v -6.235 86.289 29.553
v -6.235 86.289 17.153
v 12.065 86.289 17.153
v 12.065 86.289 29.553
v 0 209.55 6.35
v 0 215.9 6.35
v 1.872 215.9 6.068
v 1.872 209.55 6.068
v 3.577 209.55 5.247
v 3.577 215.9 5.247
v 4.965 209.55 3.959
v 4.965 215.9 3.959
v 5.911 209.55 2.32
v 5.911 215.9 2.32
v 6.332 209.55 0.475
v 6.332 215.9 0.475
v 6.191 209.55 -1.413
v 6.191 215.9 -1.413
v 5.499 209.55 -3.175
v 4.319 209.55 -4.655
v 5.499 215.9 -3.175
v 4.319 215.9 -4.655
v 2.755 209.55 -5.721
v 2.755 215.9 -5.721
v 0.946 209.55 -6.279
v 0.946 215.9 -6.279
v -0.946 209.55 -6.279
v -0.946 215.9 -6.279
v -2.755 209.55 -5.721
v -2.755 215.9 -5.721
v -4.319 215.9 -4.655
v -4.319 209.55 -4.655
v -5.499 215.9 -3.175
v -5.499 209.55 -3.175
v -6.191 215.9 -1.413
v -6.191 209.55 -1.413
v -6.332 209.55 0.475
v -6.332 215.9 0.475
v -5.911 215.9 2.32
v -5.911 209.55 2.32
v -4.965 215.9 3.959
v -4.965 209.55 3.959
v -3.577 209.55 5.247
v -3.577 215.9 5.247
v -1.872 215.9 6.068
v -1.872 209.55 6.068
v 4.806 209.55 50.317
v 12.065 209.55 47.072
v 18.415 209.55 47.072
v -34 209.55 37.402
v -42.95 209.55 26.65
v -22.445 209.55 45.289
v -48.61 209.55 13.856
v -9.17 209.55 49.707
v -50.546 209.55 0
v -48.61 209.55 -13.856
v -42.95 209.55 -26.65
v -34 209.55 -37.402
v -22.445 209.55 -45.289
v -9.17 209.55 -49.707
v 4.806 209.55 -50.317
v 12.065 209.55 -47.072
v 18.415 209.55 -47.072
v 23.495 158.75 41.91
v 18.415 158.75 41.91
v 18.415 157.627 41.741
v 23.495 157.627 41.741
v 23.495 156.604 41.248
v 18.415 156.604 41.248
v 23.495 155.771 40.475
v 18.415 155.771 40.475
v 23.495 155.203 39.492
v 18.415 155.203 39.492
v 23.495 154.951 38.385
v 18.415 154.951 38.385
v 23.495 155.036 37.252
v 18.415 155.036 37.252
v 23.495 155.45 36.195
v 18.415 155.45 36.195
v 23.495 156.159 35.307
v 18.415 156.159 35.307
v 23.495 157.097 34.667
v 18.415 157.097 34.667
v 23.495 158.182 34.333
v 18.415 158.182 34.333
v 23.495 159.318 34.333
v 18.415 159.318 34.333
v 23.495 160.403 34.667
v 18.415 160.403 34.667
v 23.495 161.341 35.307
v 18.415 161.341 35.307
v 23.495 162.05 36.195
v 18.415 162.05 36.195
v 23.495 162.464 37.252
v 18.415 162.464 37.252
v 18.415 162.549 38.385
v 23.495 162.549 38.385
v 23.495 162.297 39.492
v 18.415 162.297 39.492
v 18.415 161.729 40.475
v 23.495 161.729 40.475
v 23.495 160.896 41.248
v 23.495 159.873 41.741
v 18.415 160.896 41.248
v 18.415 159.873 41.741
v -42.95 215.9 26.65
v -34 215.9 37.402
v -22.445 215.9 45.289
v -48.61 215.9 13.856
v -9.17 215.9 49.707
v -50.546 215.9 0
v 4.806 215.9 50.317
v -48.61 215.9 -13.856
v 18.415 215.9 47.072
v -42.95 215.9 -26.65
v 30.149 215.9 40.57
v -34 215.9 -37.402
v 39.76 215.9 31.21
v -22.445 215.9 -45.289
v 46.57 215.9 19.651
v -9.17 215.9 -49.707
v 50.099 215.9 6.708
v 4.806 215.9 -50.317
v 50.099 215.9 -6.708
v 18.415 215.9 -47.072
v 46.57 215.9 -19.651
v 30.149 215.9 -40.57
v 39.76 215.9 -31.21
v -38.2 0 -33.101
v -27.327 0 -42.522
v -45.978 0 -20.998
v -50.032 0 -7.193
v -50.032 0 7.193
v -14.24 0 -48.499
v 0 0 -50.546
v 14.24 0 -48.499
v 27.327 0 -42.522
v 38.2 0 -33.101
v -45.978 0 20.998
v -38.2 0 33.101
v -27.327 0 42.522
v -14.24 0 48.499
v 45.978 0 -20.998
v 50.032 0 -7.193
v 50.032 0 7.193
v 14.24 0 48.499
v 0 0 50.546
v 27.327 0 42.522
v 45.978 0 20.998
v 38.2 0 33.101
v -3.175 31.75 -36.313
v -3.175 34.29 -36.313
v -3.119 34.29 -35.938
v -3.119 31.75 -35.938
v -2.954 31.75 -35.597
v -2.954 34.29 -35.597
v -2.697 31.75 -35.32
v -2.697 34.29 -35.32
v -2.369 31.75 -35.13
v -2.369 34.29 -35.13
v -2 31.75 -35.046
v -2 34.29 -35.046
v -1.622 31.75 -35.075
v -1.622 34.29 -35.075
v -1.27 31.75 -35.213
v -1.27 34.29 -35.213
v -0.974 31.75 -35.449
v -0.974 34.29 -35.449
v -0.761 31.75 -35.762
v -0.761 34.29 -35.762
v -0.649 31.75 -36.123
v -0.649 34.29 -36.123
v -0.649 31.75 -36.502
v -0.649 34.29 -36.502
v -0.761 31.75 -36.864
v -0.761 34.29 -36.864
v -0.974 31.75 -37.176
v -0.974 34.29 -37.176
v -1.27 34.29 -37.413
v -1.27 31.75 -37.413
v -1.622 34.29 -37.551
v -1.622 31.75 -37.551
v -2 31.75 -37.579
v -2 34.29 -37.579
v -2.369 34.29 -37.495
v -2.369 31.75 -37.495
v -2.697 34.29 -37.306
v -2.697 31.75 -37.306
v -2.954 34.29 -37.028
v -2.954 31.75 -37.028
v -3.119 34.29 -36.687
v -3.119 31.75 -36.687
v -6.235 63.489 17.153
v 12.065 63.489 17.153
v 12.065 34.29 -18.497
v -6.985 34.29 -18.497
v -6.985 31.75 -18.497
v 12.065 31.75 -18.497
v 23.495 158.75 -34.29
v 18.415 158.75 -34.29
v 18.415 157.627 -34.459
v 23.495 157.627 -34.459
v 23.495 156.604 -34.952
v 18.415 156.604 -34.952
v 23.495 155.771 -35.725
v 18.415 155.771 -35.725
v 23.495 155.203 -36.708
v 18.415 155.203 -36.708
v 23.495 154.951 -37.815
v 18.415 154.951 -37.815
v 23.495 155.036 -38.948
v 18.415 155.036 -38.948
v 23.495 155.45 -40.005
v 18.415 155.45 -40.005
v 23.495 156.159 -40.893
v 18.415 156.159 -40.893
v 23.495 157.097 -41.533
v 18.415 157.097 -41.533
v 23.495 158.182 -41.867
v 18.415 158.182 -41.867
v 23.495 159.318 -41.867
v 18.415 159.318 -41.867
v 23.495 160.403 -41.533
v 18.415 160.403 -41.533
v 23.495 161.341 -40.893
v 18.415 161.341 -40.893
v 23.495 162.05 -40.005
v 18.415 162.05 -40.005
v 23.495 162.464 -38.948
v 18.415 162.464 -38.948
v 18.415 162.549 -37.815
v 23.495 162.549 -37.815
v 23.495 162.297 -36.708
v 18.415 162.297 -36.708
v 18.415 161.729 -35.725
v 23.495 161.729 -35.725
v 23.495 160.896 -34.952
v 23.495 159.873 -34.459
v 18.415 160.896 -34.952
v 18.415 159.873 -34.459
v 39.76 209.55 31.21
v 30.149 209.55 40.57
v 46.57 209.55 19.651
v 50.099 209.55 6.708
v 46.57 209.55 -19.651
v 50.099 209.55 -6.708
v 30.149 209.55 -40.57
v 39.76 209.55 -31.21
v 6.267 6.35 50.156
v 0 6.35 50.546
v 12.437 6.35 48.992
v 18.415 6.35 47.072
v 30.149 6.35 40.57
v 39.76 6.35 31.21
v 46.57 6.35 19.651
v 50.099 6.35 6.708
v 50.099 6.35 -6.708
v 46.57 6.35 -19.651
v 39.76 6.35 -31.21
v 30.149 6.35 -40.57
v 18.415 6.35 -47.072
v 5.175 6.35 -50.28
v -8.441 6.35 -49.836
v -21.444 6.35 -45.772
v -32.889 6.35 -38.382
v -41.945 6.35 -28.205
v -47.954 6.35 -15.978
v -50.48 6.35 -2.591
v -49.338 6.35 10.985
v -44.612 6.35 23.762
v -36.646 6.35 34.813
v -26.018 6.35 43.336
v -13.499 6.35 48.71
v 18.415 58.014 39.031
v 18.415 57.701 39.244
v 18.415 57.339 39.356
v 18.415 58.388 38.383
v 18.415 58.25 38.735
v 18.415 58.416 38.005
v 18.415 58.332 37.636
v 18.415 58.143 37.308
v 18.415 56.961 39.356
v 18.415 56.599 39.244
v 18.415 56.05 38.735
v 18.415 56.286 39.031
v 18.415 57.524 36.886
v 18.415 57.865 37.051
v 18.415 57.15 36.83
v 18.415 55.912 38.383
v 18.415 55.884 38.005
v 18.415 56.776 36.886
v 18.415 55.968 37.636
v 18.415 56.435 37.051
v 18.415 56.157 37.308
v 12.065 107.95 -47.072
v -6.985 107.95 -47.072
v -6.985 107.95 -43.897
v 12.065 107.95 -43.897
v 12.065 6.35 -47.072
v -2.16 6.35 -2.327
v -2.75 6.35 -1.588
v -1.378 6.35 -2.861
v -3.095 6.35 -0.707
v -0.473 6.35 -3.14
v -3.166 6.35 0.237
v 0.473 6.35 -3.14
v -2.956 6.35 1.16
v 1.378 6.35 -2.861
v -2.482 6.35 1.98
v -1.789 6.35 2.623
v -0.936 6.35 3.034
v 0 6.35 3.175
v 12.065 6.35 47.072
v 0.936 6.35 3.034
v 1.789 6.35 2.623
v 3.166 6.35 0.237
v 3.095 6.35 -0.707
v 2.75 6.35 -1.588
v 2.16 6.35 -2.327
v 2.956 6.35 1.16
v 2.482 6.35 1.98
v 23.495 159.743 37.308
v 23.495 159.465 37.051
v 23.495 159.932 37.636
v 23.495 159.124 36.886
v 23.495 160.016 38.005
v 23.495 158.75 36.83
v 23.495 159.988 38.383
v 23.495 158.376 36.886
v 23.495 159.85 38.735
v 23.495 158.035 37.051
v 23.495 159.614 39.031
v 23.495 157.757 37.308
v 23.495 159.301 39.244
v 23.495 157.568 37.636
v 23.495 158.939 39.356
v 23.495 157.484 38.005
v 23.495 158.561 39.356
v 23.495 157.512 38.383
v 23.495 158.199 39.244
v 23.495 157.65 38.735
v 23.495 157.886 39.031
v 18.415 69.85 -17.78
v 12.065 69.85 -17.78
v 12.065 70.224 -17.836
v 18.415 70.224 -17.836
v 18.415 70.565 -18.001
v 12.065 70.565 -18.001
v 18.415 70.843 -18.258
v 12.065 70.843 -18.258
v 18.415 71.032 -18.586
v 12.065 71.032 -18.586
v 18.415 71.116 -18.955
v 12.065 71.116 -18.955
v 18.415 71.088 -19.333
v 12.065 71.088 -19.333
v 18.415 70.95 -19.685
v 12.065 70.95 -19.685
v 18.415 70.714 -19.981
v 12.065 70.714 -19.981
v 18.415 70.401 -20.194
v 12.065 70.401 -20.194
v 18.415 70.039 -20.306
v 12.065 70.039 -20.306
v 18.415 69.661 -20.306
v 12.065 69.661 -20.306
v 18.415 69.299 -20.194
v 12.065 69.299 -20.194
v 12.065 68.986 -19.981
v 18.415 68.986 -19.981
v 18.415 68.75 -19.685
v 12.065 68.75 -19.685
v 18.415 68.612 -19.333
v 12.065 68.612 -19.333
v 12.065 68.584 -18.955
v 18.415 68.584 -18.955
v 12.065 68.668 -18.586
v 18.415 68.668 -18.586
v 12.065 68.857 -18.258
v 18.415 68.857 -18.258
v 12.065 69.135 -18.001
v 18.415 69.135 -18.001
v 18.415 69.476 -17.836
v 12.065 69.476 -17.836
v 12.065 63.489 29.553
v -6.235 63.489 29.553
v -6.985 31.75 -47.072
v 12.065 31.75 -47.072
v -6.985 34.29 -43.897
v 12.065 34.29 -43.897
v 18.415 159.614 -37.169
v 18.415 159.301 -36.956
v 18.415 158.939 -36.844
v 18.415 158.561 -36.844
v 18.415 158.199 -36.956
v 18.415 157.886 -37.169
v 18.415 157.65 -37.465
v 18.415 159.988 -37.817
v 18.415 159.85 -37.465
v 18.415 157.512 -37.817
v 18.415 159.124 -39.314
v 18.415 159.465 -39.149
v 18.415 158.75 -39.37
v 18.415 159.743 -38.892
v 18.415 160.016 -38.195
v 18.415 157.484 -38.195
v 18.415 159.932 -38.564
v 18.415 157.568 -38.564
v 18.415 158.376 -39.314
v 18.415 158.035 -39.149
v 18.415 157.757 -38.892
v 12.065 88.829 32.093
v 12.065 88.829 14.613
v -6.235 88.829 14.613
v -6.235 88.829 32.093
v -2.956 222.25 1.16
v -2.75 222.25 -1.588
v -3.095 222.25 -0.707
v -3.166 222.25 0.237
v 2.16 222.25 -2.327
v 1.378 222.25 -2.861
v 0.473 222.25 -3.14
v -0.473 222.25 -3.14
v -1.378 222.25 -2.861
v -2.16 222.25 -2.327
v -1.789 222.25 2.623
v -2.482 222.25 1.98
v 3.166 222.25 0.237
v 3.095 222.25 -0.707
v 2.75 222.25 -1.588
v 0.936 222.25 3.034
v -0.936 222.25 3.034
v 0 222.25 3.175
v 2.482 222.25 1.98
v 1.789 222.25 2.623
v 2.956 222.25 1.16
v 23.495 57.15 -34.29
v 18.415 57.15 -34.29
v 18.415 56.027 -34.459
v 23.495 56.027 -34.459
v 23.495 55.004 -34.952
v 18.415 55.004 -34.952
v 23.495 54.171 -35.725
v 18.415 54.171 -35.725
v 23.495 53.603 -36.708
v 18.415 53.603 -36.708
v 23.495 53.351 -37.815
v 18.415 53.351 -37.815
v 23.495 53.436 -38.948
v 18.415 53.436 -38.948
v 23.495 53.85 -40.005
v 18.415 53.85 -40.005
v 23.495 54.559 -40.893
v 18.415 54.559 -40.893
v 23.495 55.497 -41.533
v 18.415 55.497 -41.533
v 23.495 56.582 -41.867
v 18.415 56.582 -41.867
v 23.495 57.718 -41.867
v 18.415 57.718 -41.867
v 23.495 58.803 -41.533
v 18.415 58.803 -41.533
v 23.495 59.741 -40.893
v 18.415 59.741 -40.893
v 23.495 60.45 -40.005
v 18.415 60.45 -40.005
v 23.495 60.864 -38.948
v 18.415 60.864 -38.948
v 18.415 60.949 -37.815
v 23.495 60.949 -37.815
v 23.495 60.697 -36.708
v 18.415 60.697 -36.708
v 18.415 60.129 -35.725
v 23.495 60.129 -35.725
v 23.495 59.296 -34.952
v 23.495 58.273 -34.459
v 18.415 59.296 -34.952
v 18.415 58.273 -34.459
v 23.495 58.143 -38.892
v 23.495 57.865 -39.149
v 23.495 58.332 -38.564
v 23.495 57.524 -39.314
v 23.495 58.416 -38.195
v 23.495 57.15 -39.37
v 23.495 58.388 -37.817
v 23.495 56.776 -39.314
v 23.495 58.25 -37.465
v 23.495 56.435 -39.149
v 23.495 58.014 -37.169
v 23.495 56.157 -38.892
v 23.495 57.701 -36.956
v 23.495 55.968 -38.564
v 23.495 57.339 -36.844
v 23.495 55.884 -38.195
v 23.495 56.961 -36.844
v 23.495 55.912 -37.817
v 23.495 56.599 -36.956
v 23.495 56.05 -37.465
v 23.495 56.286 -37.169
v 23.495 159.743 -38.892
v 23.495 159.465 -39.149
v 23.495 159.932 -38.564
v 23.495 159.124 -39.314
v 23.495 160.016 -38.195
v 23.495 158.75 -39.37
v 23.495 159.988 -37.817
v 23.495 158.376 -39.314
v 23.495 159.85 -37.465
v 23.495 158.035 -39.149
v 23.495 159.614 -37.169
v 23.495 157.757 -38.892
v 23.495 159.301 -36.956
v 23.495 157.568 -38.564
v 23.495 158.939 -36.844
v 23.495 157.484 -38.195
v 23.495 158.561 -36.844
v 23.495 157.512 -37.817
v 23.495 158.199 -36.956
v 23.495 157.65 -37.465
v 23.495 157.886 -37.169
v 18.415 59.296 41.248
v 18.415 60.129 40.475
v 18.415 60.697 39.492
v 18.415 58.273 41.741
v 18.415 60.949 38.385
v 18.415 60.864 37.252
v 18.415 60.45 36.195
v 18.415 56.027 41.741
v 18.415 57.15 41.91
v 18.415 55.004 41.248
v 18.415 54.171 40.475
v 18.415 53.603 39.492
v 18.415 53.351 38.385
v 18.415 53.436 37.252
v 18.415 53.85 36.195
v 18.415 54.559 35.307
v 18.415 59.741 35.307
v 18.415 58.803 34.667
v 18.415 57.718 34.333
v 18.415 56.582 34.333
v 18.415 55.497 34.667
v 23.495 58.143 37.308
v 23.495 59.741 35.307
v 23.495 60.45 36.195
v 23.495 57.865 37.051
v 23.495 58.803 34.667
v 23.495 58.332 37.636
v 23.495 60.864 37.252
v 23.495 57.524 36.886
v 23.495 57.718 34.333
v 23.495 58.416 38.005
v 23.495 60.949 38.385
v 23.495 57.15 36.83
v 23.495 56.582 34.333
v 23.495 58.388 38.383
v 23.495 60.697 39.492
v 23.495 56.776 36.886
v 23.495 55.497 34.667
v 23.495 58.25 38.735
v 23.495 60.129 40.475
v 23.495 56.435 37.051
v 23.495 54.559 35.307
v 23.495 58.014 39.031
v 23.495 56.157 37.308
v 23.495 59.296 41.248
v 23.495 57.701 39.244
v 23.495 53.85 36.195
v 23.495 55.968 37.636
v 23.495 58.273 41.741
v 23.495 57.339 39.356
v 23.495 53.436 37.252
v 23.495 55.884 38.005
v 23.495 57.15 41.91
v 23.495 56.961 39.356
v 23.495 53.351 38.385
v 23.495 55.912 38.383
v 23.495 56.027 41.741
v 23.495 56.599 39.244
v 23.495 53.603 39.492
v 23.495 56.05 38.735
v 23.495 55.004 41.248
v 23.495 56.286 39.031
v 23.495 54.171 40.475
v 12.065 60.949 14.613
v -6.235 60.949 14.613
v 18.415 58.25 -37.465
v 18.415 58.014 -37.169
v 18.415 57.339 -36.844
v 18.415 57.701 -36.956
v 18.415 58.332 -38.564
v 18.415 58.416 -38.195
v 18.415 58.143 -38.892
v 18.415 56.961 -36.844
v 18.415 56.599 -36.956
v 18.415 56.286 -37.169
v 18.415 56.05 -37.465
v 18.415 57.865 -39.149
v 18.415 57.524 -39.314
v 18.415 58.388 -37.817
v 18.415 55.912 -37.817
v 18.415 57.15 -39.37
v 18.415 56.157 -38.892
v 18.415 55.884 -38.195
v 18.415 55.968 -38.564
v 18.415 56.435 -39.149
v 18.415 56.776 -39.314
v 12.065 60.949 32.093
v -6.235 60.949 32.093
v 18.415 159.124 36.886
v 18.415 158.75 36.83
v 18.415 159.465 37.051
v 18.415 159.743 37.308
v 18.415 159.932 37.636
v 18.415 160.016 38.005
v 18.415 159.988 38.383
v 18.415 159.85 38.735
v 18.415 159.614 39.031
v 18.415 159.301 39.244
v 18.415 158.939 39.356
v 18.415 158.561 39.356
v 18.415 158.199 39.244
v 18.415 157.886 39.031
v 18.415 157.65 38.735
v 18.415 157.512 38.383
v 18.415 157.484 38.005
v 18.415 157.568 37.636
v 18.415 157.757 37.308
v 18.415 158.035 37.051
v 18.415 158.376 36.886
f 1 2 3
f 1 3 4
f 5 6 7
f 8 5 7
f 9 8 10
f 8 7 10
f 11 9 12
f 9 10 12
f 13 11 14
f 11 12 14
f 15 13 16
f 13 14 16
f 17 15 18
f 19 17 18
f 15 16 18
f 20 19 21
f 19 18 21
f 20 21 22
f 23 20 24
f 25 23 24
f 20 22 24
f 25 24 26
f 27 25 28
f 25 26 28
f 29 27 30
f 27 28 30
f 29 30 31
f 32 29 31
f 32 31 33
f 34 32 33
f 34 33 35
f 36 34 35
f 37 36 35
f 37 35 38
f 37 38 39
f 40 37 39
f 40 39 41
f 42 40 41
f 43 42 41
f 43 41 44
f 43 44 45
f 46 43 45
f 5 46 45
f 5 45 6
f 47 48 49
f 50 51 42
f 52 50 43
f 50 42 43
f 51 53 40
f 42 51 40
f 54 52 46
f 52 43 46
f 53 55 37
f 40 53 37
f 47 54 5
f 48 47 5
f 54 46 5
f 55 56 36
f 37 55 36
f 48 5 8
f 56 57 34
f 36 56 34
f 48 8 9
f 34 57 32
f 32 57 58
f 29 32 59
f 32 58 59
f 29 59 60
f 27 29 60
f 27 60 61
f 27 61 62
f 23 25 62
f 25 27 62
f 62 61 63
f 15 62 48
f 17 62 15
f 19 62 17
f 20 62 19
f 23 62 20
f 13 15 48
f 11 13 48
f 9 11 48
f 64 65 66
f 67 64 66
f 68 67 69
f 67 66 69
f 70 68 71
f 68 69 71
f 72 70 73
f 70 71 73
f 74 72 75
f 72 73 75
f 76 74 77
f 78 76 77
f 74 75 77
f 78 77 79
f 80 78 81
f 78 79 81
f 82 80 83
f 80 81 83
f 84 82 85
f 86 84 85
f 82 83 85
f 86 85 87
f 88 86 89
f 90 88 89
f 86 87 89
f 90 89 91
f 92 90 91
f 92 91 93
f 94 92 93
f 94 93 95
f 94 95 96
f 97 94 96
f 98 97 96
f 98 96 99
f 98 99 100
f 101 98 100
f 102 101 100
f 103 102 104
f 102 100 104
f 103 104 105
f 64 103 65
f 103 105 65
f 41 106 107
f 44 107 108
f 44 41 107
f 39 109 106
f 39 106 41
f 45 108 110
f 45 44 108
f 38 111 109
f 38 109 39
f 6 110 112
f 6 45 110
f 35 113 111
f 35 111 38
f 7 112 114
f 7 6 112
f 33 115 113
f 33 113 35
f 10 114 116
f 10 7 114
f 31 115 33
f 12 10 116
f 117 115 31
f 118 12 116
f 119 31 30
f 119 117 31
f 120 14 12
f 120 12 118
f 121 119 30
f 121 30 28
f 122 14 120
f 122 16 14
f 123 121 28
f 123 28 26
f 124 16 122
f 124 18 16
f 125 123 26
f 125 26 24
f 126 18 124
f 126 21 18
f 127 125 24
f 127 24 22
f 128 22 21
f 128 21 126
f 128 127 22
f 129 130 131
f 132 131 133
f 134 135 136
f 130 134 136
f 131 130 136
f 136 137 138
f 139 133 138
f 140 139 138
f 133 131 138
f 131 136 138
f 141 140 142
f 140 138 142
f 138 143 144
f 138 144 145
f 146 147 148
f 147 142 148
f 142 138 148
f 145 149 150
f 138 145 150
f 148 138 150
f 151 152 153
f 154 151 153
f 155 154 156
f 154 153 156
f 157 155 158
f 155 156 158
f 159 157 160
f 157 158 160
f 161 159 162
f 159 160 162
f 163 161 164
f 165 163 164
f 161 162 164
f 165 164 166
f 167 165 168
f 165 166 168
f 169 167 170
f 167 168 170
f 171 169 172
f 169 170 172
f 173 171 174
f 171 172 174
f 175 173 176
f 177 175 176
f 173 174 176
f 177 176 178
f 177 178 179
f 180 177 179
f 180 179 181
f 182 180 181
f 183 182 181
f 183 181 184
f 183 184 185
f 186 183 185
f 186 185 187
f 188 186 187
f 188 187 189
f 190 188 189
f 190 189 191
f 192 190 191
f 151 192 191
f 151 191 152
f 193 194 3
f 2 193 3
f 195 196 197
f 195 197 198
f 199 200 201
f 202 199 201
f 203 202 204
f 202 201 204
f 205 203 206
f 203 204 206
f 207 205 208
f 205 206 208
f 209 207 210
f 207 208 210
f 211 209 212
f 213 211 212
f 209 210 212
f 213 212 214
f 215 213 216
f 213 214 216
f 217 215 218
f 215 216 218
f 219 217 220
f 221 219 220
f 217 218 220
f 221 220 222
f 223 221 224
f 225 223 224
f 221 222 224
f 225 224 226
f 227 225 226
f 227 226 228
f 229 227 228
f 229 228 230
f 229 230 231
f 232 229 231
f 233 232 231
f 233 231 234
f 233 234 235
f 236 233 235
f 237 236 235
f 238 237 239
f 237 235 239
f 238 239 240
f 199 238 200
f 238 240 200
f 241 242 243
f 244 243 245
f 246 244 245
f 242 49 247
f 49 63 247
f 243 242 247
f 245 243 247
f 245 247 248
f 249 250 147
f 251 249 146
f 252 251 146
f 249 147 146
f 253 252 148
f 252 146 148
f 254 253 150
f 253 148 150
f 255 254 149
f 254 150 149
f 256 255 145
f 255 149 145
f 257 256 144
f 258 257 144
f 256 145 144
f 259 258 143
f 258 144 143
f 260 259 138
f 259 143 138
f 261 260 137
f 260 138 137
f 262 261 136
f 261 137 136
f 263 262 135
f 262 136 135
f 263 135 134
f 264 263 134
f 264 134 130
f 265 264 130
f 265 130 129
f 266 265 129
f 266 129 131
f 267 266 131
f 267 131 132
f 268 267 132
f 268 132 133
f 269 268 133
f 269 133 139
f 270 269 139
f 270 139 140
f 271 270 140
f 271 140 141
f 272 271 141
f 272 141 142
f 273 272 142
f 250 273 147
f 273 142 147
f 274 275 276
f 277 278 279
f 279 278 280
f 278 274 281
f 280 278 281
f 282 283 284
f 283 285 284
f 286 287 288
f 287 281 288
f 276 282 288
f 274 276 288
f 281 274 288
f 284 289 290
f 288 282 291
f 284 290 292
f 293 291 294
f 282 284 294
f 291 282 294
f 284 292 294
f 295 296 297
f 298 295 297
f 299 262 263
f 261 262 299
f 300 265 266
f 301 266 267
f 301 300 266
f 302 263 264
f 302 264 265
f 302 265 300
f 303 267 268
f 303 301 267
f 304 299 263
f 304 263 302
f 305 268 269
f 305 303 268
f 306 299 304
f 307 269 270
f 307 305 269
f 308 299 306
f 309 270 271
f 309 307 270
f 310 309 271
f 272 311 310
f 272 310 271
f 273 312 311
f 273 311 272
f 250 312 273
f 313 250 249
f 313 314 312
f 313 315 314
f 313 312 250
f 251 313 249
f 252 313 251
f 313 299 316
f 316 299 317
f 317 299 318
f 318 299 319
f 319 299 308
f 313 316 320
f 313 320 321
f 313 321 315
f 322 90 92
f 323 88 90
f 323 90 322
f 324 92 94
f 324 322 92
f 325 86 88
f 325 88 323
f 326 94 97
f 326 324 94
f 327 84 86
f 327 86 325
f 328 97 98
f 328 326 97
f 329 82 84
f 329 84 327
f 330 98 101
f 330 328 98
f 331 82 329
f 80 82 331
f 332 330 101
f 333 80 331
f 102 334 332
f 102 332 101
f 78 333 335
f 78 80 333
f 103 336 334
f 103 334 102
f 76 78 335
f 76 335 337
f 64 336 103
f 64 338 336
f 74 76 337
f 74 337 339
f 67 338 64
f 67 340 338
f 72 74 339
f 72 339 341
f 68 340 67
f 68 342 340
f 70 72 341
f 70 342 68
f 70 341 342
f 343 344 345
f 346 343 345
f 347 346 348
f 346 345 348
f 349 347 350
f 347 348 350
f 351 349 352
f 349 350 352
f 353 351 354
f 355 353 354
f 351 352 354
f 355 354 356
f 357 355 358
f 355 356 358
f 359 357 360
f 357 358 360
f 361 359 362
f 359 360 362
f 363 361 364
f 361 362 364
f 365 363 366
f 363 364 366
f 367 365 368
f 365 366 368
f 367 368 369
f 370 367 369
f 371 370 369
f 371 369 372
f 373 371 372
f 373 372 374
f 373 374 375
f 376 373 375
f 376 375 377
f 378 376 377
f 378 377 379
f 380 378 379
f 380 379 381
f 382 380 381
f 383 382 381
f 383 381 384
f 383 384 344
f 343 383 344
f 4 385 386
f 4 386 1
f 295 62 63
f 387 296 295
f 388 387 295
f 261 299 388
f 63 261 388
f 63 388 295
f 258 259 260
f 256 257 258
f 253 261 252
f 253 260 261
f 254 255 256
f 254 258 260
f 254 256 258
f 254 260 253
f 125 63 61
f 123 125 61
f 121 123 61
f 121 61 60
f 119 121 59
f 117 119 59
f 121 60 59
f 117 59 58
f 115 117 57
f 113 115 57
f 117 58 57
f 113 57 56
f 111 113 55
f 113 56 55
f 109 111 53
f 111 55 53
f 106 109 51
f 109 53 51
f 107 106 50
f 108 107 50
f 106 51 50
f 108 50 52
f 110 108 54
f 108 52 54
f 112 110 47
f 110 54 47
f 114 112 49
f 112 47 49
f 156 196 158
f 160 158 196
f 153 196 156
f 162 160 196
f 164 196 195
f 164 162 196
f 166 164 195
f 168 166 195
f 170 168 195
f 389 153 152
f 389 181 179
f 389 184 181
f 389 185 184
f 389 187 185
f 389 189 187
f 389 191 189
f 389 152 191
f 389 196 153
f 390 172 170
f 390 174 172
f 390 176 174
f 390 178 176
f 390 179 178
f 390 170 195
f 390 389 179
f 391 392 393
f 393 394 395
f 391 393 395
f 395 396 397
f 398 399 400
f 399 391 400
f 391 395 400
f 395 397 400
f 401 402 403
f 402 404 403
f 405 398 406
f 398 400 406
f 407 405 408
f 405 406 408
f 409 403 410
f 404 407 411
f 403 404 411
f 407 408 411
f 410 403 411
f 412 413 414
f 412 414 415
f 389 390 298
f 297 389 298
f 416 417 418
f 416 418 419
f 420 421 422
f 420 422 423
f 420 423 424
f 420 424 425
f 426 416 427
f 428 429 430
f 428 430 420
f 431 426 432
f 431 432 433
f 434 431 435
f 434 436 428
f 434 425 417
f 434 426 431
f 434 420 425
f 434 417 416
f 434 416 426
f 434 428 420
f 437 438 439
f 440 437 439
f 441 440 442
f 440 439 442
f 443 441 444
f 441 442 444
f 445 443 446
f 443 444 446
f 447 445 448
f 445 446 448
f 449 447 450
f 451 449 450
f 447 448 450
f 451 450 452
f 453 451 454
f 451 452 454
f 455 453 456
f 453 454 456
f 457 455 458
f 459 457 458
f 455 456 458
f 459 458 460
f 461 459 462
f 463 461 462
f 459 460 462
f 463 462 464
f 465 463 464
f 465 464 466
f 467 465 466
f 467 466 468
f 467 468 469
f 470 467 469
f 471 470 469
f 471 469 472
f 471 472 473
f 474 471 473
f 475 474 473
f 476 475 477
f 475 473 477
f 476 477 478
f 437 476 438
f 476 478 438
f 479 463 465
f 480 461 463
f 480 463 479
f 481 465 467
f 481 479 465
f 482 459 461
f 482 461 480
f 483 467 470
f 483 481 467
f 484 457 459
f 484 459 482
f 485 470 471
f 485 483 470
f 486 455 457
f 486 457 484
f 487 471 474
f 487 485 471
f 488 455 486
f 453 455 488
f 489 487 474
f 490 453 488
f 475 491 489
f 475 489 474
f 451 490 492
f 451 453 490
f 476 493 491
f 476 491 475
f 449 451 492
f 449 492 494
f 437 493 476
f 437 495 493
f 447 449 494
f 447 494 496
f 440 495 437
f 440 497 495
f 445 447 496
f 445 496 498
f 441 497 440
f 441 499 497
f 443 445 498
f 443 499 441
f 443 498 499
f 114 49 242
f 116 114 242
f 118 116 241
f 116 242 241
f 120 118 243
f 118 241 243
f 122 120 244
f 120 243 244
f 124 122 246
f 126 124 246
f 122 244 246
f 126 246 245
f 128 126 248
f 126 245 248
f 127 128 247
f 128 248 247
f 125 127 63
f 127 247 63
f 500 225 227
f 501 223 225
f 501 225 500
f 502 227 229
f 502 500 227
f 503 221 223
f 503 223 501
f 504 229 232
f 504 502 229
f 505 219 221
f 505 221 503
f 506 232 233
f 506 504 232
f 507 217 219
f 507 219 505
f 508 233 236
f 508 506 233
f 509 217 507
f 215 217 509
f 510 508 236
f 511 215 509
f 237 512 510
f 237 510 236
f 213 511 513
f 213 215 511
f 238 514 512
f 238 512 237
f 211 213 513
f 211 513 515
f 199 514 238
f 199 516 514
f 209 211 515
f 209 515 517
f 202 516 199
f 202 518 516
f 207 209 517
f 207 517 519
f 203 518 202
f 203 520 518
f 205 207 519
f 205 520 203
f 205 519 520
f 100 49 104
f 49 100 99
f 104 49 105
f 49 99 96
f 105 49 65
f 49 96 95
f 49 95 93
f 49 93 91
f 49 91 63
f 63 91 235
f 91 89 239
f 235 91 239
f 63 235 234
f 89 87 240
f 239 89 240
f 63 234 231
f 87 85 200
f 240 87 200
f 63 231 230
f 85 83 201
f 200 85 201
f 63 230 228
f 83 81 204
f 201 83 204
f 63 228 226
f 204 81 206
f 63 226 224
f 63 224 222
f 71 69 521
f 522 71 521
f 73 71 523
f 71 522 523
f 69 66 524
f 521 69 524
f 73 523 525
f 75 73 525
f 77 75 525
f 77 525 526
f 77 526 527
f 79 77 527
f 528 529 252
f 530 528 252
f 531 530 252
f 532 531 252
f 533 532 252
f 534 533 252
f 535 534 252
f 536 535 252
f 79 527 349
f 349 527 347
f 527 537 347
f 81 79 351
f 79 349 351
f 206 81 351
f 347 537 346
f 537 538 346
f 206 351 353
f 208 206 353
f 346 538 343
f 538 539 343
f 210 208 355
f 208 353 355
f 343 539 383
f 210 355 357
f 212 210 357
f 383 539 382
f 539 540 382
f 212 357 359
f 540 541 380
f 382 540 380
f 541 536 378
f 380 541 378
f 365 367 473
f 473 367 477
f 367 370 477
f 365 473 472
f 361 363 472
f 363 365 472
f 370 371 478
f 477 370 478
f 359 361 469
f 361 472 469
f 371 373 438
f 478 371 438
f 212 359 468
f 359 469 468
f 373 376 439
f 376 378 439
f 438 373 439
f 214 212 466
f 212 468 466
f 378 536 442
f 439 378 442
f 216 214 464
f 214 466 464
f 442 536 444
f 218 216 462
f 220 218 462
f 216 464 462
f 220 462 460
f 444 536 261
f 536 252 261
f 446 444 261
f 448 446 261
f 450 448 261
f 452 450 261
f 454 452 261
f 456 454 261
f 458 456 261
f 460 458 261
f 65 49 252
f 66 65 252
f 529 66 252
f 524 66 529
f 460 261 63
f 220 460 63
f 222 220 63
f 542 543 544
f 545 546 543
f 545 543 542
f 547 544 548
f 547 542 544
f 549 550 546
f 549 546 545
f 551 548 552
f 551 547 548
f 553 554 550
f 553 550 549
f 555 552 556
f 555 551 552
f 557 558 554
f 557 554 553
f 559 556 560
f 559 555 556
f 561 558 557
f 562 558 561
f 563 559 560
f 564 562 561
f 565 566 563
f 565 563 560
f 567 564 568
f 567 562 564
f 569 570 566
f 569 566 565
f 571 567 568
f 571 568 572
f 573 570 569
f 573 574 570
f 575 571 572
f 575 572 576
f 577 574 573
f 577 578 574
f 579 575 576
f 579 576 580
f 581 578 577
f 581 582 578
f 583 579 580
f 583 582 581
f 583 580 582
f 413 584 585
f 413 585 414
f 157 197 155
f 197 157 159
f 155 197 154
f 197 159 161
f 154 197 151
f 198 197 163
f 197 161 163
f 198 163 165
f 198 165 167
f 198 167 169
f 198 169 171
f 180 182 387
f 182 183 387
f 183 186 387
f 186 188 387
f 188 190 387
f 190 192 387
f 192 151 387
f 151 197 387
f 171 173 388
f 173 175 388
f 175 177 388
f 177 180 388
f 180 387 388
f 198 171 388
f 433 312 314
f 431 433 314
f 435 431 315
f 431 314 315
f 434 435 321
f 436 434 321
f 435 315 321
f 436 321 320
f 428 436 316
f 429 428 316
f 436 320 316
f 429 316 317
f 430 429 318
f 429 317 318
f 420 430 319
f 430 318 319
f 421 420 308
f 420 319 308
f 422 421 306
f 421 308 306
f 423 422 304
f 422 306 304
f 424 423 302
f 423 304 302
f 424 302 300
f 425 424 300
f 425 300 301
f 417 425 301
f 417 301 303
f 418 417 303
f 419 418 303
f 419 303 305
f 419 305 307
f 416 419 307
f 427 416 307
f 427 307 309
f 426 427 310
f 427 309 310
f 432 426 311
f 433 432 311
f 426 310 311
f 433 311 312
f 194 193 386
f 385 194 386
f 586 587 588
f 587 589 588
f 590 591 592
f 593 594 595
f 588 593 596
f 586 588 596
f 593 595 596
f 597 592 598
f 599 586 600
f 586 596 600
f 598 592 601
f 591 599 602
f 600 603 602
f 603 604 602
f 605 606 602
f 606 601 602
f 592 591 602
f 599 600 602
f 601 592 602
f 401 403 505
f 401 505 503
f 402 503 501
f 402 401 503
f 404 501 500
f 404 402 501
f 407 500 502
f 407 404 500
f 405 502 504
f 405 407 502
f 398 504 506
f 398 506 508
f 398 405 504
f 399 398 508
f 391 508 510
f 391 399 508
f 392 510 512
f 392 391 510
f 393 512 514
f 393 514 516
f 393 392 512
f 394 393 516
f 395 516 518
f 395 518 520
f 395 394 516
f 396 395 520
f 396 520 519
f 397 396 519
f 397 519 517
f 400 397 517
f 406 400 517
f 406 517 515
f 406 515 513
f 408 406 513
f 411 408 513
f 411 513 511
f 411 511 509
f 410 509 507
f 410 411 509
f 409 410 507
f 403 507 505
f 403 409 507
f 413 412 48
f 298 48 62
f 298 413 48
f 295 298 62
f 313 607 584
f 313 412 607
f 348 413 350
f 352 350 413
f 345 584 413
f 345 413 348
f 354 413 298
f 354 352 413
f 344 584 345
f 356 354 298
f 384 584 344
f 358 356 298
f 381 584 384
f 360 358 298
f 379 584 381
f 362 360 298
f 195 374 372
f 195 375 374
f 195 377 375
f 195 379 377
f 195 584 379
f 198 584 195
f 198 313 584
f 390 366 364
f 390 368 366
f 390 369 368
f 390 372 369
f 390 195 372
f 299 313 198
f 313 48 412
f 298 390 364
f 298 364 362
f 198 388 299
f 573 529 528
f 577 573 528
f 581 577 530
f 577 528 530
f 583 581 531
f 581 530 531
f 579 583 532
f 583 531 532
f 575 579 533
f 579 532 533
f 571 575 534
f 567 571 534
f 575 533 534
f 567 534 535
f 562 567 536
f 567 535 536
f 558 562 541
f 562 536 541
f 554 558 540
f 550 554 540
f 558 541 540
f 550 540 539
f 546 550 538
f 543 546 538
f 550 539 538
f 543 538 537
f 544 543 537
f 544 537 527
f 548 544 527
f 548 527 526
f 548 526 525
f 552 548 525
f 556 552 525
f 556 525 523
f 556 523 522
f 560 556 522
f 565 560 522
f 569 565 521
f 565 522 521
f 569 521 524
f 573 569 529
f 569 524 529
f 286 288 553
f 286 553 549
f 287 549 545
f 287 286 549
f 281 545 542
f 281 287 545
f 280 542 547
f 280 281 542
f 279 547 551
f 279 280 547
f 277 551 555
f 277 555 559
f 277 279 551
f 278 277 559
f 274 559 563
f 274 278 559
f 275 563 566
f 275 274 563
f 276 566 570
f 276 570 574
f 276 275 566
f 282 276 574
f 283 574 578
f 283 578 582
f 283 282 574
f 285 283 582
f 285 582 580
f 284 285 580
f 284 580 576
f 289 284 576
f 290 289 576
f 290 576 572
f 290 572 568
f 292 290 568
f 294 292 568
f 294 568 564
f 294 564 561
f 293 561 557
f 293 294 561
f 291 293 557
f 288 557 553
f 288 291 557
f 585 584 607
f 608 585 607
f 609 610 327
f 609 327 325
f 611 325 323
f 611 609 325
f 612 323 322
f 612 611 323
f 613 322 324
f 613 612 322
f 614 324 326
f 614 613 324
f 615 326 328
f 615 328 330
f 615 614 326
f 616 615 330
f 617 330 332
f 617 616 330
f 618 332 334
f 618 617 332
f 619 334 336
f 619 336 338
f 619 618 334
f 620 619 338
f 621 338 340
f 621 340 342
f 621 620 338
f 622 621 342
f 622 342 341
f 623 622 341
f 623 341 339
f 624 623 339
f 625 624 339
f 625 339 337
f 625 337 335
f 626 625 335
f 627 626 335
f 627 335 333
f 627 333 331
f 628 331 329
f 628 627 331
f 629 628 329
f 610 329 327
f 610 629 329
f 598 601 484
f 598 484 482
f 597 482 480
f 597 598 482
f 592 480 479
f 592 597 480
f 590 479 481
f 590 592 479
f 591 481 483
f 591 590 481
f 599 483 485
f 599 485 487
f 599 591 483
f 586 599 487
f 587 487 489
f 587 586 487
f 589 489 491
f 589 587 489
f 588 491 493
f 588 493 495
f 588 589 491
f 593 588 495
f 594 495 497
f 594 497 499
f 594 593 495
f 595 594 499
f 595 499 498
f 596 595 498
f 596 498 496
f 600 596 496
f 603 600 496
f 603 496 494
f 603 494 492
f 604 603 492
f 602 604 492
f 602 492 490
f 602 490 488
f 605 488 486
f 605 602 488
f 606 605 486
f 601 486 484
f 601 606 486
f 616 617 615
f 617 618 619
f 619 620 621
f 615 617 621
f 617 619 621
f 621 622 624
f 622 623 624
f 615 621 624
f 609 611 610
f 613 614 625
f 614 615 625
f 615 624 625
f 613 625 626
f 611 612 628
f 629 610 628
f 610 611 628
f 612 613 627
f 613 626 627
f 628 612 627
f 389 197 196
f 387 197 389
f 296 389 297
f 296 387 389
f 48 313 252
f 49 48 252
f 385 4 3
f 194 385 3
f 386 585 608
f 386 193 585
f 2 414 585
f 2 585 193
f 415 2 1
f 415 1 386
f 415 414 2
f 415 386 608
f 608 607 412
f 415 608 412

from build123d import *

# Parameters (mm, degrees)
SKETCH1_R           = 50.546
BOSS_EXTRUDE1_DEPTH = 6.35
SKETCH3_W           = 6.35
SKETCH3_H           = 94.144269948
BOSS_EXTRUDE2_DEPTH = 203.2
BOSS_EXTRUDE3_DEPTH = 6.35
CUT_EXTRUDE1_REACH  = 229.426
SKETCH5_R           = 6.35
SKETCH7_R           = 3.175
BOSS_EXTRUDE4_DEPTH = 215.9
SKETCH8_R           = 1.27
CUT_EXTRUDE2_DEPTH  = 237.368563766
SKETCH9_W           = 3.175
SKETCH9_H           = 76.2
BOSS_EXTRUDE5_DEPTH = 19.05
SKETCH10_W          = 19.05
SKETCH10_H          = 2.54
BOSS_EXTRUDE6_DEPTH = 25.4
CUT_EXTRUDE3_REACH  = 203.094
SKETCH11_R          = 1.27
SKETCH12_W          = 17.48
SKETCH12_H          = 27.88
SKETCH12_W_2        = 12.4
SKETCH12_H_2        = 22.8
BOSS_EXTRUDE7_DEPTH = 18.3
SKETCH13_R          = 3.81
SKETCH13_R_2        = 1.27
BOSS_EXTRUDE8_DEPTH = 5.08


with BuildPart() as part:
    # Sketch1 → Boss-Extrude1 (new body)
    with BuildSketch(Plane(origin=(0, 0, 0), x_dir=(1, 0, 0), z_dir=(0, 1, 0))):
        with Locations(Location((0, 0, 0), (0, 0, 270))):
            Circle(SKETCH1_R)
    extrude(amount=BOSS_EXTRUDE1_DEPTH)

    # Sketch3 → Boss-Extrude2 (add)
    with BuildSketch(Plane(origin=(0, 6.35, 0), x_dir=(1, 0, 0), z_dir=(0, 1, 0))):
        with Locations((15.24, 0)):
            Rectangle(SKETCH3_W, SKETCH3_H)
    extrude(amount=BOSS_EXTRUDE2_DEPTH)

    # Sketch4 → Boss-Extrude3 (add)
    with BuildSketch(Plane(origin=(0, 209.55, 0), x_dir=(1, 0, 0), z_dir=(0, 1, 0))):
        with BuildLine():
            ThreePointArc((18.415, 47.072134974), (-50.546, 0), (18.415, -47.072134974))
            ThreePointArc((18.415, -47.072134974), (50.546, 0), (18.415, 47.072134974))
        make_face()
    extrude(amount=BOSS_EXTRUDE3_DEPTH)

    # Sketch5 → Cut-Extrude1 (cut, up to next)
    with BuildSketch(Plane(origin=(0, 215.9, 0), x_dir=(1, 0, 0), z_dir=(0, 1, 0)), mode=Mode.PRIVATE) as cut_extrude1_sk1:
        with Locations(Location((0, 0, 0), (0, 0, 270))):
            Circle(SKETCH5_R)
    cut_extrude1_tool1 = extrude(cut_extrude1_sk1.sketch, amount=-CUT_EXTRUDE1_REACH, mode=Mode.PRIVATE) & part.part
    add(cut_extrude1_tool1.solids().sort_by_distance((0, 215.9, 0))[0], mode=Mode.SUBTRACT)

    # Sketch7 → Boss-Extrude4 (add)
    with BuildSketch(Plane(origin=(0, 6.35, 0), x_dir=(1, 0, 0), z_dir=(0, 1, 0))):
        with Locations(Location((0, 0, 0), (0, 0, 270))):
            Circle(SKETCH7_R)
    extrude(amount=BOSS_EXTRUDE4_DEPTH)

    # Sketch8 → Cut-Extrude2 (cut, through all)
    with BuildSketch(Plane.ZY.offset(-12.065)):
        with Locations((-19.05, 69.85)):
            Circle(SKETCH8_R)
    extrude(amount=-CUT_EXTRUDE2_DEPTH, mode=Mode.SUBTRACT)

    # Sketch9 → Boss-Extrude5 (add)
    with BuildSketch(Plane.ZY.offset(-12.065)):
        with Locations((-45.484634974, 69.85)):
            Rectangle(SKETCH9_W, SKETCH9_H)
    extrude(amount=BOSS_EXTRUDE5_DEPTH)

    # Sketch10 → Boss-Extrude6 (add)
    with BuildSketch(Plane.XY.offset(-43.897134974)):
        with Locations((2.54, 33.02)):
            Rectangle(SKETCH10_W, SKETCH10_H)
    extrude(amount=BOSS_EXTRUDE6_DEPTH)

    # Sketch11 → Cut-Extrude3 (cut, up to next)
    with BuildSketch(Plane(origin=(0, 34.29, 0), x_dir=(1, 0, 0), z_dir=(0, 1, 0)), mode=Mode.PRIVATE) as cut_extrude3_sk1:
        with Locations(Location((-1.905, 36.312665469, 0), (0, 0, 180))):
            Circle(SKETCH11_R)
    cut_extrude3_tool1 = extrude(cut_extrude3_sk1.sketch, amount=-CUT_EXTRUDE3_REACH, mode=Mode.PRIVATE) & part.part
    add(cut_extrude3_tool1.solids().sort_by_distance((-1.905, 34.29, -36.312665))[0], mode=Mode.SUBTRACT)

    # Sketch12 → Boss-Extrude7 (add)
    with BuildSketch(Plane.ZY.offset(-12.065)):
        with Locations((23.352648963, 74.888693437)):
            Rectangle(SKETCH12_W, SKETCH12_H)
        with Locations((23.352648963, 74.888693437)):
            Rectangle(SKETCH12_W_2, SKETCH12_H_2, mode=Mode.SUBTRACT)
    extrude(amount=BOSS_EXTRUDE7_DEPTH)

    # Sketch13 → Boss-Extrude8 (add)
    # profile 1 of 4: a face of its own
    with BuildSketch(Plane(origin=(18.415, 0, 0), x_dir=(0, 0, -1), z_dir=(1, 0, 0))):
        with Locations(Location((-38.1, 158.75, 0), (0, 0, 180))):
            Circle(SKETCH13_R)
        with Locations((-38.1, 158.75)):
            Circle(SKETCH13_R_2, mode=Mode.SUBTRACT)
    # profile 2 of 4: a face of its own
    with BuildSketch(Plane(origin=(18.415, 0, 0), x_dir=(0, 0, -1), z_dir=(1, 0, 0))):
        with Locations(Location((38.1, 158.75, 0), (0, 0, 180))):
            Circle(SKETCH13_R)
        with Locations((38.1, 158.75)):
            Circle(SKETCH13_R_2, mode=Mode.SUBTRACT)
    # profile 3 of 4: a face of its own
    with BuildSketch(Plane(origin=(18.415, 0, 0), x_dir=(0, 0, -1), z_dir=(1, 0, 0))):
        with Locations(Location((-38.1, 57.15, 0), (0, 0, 180))):
            Circle(SKETCH13_R)
        with Locations((-38.1, 57.15)):
            Circle(SKETCH13_R_2, mode=Mode.SUBTRACT)
    # profile 4 of 4: a face of its own
    with BuildSketch(Plane(origin=(18.415, 0, 0), x_dir=(0, 0, -1), z_dir=(1, 0, 0))):
        with Locations(Location((38.1, 57.15, 0), (0, 0, 180))):
            Circle(SKETCH13_R)
        with Locations((38.1, 57.15)):
            Circle(SKETCH13_R_2, mode=Mode.SUBTRACT)
    extrude(amount=BOSS_EXTRUDE8_DEPTH)


solid = part.part
